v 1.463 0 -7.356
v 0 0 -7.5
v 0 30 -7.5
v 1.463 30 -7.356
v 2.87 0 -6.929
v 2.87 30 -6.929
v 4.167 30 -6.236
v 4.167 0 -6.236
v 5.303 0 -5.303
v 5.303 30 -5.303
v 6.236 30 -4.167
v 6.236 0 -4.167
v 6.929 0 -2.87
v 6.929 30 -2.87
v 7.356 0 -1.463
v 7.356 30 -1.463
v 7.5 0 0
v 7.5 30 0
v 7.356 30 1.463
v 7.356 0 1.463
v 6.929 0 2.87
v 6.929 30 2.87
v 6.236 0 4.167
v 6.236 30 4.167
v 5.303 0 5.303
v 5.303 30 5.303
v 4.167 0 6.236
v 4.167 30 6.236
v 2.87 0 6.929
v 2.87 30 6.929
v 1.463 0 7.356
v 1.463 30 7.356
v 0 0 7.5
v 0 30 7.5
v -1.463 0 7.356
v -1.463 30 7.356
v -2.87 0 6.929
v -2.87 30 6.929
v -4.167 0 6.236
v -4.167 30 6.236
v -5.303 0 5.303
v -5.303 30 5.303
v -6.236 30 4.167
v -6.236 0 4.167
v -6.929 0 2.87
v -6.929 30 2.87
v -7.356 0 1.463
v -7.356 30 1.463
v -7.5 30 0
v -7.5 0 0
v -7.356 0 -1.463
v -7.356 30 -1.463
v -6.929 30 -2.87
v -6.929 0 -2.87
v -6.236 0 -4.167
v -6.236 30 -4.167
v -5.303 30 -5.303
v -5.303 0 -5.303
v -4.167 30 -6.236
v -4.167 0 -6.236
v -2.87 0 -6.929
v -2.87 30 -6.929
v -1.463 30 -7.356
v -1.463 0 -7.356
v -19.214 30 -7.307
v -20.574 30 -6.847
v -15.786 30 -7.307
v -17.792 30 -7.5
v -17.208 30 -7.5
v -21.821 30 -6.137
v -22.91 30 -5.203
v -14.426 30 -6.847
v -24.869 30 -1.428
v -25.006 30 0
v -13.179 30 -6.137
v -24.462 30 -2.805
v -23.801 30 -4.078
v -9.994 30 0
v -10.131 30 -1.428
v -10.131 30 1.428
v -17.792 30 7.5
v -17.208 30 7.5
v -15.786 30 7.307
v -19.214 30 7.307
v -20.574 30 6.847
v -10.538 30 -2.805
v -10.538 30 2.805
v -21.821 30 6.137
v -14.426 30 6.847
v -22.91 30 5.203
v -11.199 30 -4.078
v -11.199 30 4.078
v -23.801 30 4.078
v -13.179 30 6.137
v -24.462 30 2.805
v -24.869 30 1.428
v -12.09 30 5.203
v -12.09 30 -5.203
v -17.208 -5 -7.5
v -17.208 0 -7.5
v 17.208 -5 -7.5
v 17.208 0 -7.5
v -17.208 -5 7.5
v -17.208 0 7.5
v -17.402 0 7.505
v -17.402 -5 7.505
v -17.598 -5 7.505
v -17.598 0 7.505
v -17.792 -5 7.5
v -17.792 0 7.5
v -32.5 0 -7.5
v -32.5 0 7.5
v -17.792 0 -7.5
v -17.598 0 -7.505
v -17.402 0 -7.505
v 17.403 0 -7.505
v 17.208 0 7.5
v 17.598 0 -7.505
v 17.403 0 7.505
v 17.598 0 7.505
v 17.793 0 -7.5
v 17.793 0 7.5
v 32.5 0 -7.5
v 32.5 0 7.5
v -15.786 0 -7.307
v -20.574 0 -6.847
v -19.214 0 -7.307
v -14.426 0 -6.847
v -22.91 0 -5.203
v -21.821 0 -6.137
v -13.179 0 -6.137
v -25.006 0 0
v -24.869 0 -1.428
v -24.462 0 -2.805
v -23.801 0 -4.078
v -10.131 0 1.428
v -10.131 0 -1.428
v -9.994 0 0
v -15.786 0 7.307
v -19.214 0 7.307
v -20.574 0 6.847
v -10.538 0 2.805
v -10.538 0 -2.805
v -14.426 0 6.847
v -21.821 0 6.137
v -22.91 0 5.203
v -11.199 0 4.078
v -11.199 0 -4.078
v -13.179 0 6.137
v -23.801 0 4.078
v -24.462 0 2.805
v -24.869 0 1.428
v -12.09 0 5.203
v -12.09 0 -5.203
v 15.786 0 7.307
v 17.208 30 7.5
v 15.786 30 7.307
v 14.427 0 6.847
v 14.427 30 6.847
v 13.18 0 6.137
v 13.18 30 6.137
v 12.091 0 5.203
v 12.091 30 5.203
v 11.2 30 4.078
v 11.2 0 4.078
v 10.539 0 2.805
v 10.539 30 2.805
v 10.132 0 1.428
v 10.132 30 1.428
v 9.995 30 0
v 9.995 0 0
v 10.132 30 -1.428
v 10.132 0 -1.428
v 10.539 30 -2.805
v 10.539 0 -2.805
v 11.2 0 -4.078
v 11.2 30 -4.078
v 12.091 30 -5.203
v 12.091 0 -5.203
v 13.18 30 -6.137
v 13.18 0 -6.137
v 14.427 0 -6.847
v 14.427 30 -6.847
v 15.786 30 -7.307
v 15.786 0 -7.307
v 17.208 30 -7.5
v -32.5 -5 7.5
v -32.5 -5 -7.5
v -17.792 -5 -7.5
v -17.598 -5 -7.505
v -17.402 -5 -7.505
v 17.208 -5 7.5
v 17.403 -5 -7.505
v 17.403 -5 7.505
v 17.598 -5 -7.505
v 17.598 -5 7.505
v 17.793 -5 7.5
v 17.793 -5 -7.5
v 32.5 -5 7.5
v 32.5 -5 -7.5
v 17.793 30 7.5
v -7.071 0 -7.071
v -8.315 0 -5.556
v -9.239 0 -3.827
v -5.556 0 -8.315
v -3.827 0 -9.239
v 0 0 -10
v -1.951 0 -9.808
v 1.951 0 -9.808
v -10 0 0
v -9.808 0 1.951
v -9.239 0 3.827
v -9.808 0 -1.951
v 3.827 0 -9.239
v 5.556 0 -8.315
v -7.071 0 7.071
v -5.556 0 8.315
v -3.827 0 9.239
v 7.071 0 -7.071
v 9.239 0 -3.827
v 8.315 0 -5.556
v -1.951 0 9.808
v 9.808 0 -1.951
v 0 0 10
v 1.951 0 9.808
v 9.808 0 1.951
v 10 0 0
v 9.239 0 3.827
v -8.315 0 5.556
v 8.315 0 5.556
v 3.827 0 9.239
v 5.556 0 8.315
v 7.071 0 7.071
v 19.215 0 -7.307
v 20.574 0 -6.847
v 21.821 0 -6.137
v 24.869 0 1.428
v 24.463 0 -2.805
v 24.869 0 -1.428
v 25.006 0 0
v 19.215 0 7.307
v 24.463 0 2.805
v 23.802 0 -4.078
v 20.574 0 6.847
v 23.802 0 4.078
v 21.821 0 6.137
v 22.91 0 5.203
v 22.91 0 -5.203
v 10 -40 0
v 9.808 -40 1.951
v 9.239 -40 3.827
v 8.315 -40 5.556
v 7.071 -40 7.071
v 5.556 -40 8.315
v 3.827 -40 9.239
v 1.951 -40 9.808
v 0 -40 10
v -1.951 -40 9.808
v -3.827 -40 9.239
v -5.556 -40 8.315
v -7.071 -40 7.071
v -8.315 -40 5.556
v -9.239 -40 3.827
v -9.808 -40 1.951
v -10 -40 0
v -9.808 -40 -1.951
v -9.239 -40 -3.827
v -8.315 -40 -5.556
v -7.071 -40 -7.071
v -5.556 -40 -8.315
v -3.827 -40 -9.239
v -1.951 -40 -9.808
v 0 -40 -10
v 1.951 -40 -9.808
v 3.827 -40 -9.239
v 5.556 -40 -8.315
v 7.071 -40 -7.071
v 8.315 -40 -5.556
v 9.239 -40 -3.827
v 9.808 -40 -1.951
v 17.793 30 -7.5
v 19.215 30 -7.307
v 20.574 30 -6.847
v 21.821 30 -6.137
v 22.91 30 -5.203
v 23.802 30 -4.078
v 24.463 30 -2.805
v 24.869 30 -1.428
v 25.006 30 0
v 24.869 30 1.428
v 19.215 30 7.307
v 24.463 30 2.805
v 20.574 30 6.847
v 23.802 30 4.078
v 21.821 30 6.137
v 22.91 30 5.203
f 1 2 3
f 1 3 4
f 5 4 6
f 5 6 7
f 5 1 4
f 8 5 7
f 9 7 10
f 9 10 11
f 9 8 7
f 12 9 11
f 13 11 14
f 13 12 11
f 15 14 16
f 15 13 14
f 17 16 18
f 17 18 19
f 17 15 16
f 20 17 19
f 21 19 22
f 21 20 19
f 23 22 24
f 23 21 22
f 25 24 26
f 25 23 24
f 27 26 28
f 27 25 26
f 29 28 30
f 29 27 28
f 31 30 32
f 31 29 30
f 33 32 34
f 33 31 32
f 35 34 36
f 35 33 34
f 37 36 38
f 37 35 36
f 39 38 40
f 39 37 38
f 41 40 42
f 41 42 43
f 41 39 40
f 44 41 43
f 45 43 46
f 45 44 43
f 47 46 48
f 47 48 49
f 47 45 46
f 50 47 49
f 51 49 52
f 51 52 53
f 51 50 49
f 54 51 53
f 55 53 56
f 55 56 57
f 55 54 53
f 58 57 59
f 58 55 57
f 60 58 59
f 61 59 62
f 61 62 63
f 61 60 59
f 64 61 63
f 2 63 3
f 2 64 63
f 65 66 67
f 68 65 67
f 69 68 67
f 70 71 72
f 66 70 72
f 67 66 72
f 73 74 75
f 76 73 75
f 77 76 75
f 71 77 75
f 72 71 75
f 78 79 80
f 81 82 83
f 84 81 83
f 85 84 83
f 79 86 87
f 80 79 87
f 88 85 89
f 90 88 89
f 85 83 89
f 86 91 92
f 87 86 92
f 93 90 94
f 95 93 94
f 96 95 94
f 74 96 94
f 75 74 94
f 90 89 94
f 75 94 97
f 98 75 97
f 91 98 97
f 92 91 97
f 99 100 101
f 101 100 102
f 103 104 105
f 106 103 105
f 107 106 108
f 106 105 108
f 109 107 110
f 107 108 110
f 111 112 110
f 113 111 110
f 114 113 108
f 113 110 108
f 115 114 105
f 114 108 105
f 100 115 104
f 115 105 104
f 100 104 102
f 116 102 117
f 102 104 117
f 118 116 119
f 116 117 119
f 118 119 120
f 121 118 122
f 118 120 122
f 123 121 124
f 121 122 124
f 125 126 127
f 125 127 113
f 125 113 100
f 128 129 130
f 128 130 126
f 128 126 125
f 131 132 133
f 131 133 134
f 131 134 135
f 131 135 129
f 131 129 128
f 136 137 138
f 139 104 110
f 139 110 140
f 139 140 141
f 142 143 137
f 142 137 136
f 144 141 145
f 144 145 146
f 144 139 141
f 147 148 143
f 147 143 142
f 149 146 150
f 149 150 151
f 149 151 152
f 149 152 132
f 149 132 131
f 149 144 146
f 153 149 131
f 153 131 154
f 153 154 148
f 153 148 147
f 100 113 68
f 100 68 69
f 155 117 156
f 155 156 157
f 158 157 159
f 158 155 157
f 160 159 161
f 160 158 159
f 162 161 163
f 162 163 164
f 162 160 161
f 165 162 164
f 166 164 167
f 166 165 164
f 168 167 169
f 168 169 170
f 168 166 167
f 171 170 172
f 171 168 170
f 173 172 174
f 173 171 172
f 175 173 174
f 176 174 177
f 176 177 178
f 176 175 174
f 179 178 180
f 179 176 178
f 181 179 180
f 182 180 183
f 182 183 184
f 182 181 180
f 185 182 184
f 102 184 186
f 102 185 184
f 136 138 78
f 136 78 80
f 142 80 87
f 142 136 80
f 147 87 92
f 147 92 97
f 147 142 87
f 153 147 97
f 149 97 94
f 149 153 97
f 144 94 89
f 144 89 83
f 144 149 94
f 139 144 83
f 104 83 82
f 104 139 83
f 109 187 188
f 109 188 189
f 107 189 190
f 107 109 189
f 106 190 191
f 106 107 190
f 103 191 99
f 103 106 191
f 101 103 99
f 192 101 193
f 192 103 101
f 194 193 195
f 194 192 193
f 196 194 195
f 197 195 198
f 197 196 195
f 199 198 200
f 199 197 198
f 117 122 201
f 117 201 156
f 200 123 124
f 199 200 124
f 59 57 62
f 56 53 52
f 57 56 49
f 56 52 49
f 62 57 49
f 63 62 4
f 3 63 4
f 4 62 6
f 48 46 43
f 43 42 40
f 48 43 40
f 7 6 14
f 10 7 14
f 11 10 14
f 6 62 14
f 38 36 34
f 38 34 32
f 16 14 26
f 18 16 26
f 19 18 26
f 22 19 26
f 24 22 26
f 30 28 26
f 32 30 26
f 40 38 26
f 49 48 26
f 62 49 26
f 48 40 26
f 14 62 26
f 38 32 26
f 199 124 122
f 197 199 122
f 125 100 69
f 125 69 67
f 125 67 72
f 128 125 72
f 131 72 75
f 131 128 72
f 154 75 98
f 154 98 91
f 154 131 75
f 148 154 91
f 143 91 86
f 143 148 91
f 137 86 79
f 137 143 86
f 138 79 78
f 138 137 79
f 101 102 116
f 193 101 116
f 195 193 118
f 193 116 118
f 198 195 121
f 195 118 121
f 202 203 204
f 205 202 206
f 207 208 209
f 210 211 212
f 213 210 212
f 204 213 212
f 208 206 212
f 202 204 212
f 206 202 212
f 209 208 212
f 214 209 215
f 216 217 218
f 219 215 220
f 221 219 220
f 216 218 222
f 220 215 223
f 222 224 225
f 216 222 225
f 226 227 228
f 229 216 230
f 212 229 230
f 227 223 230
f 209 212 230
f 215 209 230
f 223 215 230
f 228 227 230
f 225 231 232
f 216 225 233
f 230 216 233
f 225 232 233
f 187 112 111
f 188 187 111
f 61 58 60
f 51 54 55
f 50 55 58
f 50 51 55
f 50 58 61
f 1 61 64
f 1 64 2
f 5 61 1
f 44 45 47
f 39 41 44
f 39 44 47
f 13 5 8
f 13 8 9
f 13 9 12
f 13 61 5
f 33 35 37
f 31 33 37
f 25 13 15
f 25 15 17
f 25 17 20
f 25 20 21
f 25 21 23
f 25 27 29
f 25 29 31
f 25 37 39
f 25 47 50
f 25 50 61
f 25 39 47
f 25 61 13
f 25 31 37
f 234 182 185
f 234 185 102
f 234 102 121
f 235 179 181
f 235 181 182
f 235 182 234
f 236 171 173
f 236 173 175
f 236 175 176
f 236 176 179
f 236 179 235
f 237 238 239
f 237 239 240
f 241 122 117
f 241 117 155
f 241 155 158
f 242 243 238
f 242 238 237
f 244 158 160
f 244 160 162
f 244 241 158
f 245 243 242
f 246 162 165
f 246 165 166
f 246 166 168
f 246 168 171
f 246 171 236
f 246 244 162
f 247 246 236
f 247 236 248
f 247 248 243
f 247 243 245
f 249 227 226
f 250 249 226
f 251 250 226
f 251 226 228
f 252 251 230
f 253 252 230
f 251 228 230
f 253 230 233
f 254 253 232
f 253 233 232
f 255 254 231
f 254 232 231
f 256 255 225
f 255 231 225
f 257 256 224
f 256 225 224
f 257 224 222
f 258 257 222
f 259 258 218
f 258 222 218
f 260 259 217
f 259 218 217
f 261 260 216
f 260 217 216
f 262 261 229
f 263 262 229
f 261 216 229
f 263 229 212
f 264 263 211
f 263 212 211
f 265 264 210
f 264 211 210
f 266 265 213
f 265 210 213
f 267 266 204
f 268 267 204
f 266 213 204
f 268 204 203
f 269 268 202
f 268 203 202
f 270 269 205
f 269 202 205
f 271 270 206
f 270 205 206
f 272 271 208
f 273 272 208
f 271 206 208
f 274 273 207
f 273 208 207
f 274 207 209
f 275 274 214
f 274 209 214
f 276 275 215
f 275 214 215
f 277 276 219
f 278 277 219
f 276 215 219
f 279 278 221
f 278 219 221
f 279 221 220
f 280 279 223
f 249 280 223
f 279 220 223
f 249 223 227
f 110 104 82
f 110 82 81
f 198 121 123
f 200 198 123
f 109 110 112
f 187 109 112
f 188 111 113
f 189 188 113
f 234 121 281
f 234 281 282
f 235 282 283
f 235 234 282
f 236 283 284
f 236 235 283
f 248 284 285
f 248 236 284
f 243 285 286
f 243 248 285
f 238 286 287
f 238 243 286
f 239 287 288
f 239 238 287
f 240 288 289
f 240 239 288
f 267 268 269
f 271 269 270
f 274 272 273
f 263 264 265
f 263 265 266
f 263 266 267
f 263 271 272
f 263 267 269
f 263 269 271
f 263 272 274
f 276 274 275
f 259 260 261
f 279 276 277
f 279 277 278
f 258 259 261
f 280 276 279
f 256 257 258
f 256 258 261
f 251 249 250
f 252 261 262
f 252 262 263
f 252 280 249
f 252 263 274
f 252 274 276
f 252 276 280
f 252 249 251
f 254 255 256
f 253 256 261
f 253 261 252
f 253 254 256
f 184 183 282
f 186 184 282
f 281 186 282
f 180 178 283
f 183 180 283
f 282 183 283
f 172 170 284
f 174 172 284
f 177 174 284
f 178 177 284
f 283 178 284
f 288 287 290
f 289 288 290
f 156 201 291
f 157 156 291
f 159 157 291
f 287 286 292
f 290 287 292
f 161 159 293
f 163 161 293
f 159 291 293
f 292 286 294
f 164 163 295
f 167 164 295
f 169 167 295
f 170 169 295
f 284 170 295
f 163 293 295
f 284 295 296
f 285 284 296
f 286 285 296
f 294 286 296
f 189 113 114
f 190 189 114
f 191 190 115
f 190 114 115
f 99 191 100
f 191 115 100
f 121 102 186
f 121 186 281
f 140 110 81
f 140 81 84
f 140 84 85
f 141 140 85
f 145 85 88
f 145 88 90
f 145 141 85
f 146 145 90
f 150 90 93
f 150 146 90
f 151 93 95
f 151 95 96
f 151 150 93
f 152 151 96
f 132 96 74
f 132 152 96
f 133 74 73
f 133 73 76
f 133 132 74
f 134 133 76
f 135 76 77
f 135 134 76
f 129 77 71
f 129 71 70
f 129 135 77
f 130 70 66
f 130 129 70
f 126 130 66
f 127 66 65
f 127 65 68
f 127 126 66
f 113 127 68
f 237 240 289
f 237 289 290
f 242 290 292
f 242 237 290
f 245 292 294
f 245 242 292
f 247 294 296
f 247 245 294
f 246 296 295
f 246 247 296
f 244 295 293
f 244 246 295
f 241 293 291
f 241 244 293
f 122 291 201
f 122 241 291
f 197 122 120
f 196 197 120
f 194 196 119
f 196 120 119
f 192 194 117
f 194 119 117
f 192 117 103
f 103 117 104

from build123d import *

# Parameters (mm, degrees)
F1_DEPTH = 5
F2_DEPTH = 30
F3_R     = 10
F4_DEPTH = 40


with BuildPart() as f1:
    # F0 (on Front) → F1 (new body)
    with BuildSketch(Plane.XZ):
        with BuildLine():
            Line((-17.7924593818, 7.5), (-32.5, 7.5))
            Line((-32.5, 7.5), (-32.5, -7.5))
            Line((-32.5, -7.5), (-17.7924593818, -7.5))
            ThreePointArc((-17.7924593818, -7.5), (-25.0057, 0), (-17.7924593818, 7.5))
        make_face()
        with BuildLine():
            Line((0, 7.5), (-17.2075406182, 7.5))
            ThreePointArc((-17.2075406182, 7.5), (-12.0902567126, 5.202904002), (-9.9943, 0))
            ThreePointArc((-9.9943, 0), (-12.0902567126, -5.202904002), (-17.2075406182, -7.5))
            Line((-17.2075406182, -7.5), (-2.86e-08, -7.5))
            ThreePointArc((-2.86e-08, -7.5), (-7.5, 1.43e-08), (0, 7.5))
        make_face()
        with BuildLine():
            Line((17.2081406182, 7.5), (0, 7.5))
            ThreePointArc((0, 7.5), (5.3033008589, 5.3033008589), (7.5, 0))
            ThreePointArc((7.5, 0), (5.3033008488, -5.303300869), (-2.86e-08, -7.5))
            Line((-2.86e-08, -7.5), (17.2081406182, -7.5))
            ThreePointArc((17.2081406182, -7.5), (9.9949, 0), (17.2081406182, 7.5))
        make_face()
        with BuildLine():
            Line((32.5, 7.5), (17.7930593818, 7.5))
            ThreePointArc((17.7930593818, 7.5), (22.9103432874, 5.202904002), (25.0063, 0))
            ThreePointArc((25.0063, 0), (22.9103432874, -5.202904002), (17.7930593818, -7.5))
            Line((17.7930593818, -7.5), (32.5, -7.5))
            Line((32.5, -7.5), (32.5, 7.5))
        make_face()
        with BuildLine():
            Line((17.7930593818, -7.5), (17.2081406182, -7.5))
            ThreePointArc((17.2081406182, -7.5), (17.5006, -7.5057), (17.7930593818, -7.5))
        make_face()
        with BuildLine():
            ThreePointArc((17.7930593818, 7.5), (17.5006, 7.5057), (17.2081406182, 7.5))
            Line((17.2081406182, 7.5), (17.7930593818, 7.5))
        make_face()
        with BuildLine():
            ThreePointArc((-17.2075406182, 7.5), (-17.5, 7.5057), (-17.7924593818, 7.5))
            Line((-17.7924593818, 7.5), (-17.2075406182, 7.5))
        make_face()
        with BuildLine():
            Line((-17.2075406182, -7.5), (-17.7924593818, -7.5))
            ThreePointArc((-17.7924593818, -7.5), (-17.5, -7.5057), (-17.2075406182, -7.5))
        make_face()
        with BuildLine():
            Line((-17.2075406182, 7.5), (-17.7924593818, 7.5))
            ThreePointArc((-17.7924593818, 7.5), (-25.0057, 0), (-17.7924593818, -7.5))
            Line((-17.7924593818, -7.5), (-17.2075406182, -7.5))
            ThreePointArc((-17.2075406182, -7.5), (-12.0902567126, -5.202904002), (-9.9943, 0))
            ThreePointArc((-9.9943, 0), (-12.0902567126, 5.202904002), (-17.2075406182, 7.5))
        make_face()
        with BuildLine():
            ThreePointArc((7.5, 0), (5.3033008589, 5.3033008589), (0, 7.5))
            ThreePointArc((0, 7.5), (-7.5, 1.43e-08), (-2.86e-08, -7.5))
            ThreePointArc((-2.86e-08, -7.5), (5.3033008488, -5.303300869), (7.5, 0))
        make_face()
        with BuildLine():
            Line((17.7930593818, 7.5), (17.2081406182, 7.5))
            ThreePointArc((17.2081406182, 7.5), (9.9949, 0), (17.2081406182, -7.5))
            Line((17.2081406182, -7.5), (17.7930593818, -7.5))
            ThreePointArc((17.7930593818, -7.5), (22.9103432874, -5.202904002), (25.0063, 0))
            ThreePointArc((25.0063, 0), (22.9103432874, 5.202904002), (17.7930593818, 7.5))
        make_face()
    extrude(amount=F1_DEPTH)


with BuildPart() as f2:
    # F0 (on Front) → F2 (new body)
    with BuildSketch(Plane.XZ):
        with BuildLine():
            Line((-17.2075406182, 7.5), (-17.7924593818, 7.5))
            ThreePointArc((-17.7924593818, 7.5), (-25.0057, 0), (-17.7924593818, -7.5))
            Line((-17.7924593818, -7.5), (-17.2075406182, -7.5))
            ThreePointArc((-17.2075406182, -7.5), (-12.0902567126, -5.202904002), (-9.9943, 0))
            ThreePointArc((-9.9943, 0), (-12.0902567126, 5.202904002), (-17.2075406182, 7.5))
        make_face()
    extrude(amount=-F2_DEPTH)


with BuildPart() as f2b:
    # F0 (on Front) → F2, piece 2 (new body)
    with BuildSketch(Plane.XZ):
        with BuildLine():
            ThreePointArc((7.5, 0), (5.3033008589, 5.3033008589), (0, 7.5))
            ThreePointArc((0, 7.5), (-7.5, 1.43e-08), (-2.86e-08, -7.5))
            ThreePointArc((-2.86e-08, -7.5), (5.3033008488, -5.303300869), (7.5, 0))
        make_face()
    extrude(amount=-F2_DEPTH)


with BuildPart() as f2c:
    # F0 (on Front) → F2, piece 3 (new body)
    with BuildSketch(Plane.XZ):
        with BuildLine():
            Line((17.7930593818, 7.5), (17.2081406182, 7.5))
            ThreePointArc((17.2081406182, 7.5), (9.9949, 0), (17.2081406182, -7.5))
            Line((17.2081406182, -7.5), (17.7930593818, -7.5))
            ThreePointArc((17.7930593818, -7.5), (22.9103432874, -5.202904002), (25.0063, 0))
            ThreePointArc((25.0063, 0), (22.9103432874, 5.202904002), (17.7930593818, 7.5))
        make_face()
    extrude(amount=-F2_DEPTH)


with BuildPart() as f4:
    # F3 (on Front) → F4 (new body)
    with BuildSketch(Plane.XZ):
        Circle(F3_R)
    extrude(amount=F4_DEPTH)


solid = Compound([f1.part, f2.part, f2b.part, f2c.part, f4.part])
